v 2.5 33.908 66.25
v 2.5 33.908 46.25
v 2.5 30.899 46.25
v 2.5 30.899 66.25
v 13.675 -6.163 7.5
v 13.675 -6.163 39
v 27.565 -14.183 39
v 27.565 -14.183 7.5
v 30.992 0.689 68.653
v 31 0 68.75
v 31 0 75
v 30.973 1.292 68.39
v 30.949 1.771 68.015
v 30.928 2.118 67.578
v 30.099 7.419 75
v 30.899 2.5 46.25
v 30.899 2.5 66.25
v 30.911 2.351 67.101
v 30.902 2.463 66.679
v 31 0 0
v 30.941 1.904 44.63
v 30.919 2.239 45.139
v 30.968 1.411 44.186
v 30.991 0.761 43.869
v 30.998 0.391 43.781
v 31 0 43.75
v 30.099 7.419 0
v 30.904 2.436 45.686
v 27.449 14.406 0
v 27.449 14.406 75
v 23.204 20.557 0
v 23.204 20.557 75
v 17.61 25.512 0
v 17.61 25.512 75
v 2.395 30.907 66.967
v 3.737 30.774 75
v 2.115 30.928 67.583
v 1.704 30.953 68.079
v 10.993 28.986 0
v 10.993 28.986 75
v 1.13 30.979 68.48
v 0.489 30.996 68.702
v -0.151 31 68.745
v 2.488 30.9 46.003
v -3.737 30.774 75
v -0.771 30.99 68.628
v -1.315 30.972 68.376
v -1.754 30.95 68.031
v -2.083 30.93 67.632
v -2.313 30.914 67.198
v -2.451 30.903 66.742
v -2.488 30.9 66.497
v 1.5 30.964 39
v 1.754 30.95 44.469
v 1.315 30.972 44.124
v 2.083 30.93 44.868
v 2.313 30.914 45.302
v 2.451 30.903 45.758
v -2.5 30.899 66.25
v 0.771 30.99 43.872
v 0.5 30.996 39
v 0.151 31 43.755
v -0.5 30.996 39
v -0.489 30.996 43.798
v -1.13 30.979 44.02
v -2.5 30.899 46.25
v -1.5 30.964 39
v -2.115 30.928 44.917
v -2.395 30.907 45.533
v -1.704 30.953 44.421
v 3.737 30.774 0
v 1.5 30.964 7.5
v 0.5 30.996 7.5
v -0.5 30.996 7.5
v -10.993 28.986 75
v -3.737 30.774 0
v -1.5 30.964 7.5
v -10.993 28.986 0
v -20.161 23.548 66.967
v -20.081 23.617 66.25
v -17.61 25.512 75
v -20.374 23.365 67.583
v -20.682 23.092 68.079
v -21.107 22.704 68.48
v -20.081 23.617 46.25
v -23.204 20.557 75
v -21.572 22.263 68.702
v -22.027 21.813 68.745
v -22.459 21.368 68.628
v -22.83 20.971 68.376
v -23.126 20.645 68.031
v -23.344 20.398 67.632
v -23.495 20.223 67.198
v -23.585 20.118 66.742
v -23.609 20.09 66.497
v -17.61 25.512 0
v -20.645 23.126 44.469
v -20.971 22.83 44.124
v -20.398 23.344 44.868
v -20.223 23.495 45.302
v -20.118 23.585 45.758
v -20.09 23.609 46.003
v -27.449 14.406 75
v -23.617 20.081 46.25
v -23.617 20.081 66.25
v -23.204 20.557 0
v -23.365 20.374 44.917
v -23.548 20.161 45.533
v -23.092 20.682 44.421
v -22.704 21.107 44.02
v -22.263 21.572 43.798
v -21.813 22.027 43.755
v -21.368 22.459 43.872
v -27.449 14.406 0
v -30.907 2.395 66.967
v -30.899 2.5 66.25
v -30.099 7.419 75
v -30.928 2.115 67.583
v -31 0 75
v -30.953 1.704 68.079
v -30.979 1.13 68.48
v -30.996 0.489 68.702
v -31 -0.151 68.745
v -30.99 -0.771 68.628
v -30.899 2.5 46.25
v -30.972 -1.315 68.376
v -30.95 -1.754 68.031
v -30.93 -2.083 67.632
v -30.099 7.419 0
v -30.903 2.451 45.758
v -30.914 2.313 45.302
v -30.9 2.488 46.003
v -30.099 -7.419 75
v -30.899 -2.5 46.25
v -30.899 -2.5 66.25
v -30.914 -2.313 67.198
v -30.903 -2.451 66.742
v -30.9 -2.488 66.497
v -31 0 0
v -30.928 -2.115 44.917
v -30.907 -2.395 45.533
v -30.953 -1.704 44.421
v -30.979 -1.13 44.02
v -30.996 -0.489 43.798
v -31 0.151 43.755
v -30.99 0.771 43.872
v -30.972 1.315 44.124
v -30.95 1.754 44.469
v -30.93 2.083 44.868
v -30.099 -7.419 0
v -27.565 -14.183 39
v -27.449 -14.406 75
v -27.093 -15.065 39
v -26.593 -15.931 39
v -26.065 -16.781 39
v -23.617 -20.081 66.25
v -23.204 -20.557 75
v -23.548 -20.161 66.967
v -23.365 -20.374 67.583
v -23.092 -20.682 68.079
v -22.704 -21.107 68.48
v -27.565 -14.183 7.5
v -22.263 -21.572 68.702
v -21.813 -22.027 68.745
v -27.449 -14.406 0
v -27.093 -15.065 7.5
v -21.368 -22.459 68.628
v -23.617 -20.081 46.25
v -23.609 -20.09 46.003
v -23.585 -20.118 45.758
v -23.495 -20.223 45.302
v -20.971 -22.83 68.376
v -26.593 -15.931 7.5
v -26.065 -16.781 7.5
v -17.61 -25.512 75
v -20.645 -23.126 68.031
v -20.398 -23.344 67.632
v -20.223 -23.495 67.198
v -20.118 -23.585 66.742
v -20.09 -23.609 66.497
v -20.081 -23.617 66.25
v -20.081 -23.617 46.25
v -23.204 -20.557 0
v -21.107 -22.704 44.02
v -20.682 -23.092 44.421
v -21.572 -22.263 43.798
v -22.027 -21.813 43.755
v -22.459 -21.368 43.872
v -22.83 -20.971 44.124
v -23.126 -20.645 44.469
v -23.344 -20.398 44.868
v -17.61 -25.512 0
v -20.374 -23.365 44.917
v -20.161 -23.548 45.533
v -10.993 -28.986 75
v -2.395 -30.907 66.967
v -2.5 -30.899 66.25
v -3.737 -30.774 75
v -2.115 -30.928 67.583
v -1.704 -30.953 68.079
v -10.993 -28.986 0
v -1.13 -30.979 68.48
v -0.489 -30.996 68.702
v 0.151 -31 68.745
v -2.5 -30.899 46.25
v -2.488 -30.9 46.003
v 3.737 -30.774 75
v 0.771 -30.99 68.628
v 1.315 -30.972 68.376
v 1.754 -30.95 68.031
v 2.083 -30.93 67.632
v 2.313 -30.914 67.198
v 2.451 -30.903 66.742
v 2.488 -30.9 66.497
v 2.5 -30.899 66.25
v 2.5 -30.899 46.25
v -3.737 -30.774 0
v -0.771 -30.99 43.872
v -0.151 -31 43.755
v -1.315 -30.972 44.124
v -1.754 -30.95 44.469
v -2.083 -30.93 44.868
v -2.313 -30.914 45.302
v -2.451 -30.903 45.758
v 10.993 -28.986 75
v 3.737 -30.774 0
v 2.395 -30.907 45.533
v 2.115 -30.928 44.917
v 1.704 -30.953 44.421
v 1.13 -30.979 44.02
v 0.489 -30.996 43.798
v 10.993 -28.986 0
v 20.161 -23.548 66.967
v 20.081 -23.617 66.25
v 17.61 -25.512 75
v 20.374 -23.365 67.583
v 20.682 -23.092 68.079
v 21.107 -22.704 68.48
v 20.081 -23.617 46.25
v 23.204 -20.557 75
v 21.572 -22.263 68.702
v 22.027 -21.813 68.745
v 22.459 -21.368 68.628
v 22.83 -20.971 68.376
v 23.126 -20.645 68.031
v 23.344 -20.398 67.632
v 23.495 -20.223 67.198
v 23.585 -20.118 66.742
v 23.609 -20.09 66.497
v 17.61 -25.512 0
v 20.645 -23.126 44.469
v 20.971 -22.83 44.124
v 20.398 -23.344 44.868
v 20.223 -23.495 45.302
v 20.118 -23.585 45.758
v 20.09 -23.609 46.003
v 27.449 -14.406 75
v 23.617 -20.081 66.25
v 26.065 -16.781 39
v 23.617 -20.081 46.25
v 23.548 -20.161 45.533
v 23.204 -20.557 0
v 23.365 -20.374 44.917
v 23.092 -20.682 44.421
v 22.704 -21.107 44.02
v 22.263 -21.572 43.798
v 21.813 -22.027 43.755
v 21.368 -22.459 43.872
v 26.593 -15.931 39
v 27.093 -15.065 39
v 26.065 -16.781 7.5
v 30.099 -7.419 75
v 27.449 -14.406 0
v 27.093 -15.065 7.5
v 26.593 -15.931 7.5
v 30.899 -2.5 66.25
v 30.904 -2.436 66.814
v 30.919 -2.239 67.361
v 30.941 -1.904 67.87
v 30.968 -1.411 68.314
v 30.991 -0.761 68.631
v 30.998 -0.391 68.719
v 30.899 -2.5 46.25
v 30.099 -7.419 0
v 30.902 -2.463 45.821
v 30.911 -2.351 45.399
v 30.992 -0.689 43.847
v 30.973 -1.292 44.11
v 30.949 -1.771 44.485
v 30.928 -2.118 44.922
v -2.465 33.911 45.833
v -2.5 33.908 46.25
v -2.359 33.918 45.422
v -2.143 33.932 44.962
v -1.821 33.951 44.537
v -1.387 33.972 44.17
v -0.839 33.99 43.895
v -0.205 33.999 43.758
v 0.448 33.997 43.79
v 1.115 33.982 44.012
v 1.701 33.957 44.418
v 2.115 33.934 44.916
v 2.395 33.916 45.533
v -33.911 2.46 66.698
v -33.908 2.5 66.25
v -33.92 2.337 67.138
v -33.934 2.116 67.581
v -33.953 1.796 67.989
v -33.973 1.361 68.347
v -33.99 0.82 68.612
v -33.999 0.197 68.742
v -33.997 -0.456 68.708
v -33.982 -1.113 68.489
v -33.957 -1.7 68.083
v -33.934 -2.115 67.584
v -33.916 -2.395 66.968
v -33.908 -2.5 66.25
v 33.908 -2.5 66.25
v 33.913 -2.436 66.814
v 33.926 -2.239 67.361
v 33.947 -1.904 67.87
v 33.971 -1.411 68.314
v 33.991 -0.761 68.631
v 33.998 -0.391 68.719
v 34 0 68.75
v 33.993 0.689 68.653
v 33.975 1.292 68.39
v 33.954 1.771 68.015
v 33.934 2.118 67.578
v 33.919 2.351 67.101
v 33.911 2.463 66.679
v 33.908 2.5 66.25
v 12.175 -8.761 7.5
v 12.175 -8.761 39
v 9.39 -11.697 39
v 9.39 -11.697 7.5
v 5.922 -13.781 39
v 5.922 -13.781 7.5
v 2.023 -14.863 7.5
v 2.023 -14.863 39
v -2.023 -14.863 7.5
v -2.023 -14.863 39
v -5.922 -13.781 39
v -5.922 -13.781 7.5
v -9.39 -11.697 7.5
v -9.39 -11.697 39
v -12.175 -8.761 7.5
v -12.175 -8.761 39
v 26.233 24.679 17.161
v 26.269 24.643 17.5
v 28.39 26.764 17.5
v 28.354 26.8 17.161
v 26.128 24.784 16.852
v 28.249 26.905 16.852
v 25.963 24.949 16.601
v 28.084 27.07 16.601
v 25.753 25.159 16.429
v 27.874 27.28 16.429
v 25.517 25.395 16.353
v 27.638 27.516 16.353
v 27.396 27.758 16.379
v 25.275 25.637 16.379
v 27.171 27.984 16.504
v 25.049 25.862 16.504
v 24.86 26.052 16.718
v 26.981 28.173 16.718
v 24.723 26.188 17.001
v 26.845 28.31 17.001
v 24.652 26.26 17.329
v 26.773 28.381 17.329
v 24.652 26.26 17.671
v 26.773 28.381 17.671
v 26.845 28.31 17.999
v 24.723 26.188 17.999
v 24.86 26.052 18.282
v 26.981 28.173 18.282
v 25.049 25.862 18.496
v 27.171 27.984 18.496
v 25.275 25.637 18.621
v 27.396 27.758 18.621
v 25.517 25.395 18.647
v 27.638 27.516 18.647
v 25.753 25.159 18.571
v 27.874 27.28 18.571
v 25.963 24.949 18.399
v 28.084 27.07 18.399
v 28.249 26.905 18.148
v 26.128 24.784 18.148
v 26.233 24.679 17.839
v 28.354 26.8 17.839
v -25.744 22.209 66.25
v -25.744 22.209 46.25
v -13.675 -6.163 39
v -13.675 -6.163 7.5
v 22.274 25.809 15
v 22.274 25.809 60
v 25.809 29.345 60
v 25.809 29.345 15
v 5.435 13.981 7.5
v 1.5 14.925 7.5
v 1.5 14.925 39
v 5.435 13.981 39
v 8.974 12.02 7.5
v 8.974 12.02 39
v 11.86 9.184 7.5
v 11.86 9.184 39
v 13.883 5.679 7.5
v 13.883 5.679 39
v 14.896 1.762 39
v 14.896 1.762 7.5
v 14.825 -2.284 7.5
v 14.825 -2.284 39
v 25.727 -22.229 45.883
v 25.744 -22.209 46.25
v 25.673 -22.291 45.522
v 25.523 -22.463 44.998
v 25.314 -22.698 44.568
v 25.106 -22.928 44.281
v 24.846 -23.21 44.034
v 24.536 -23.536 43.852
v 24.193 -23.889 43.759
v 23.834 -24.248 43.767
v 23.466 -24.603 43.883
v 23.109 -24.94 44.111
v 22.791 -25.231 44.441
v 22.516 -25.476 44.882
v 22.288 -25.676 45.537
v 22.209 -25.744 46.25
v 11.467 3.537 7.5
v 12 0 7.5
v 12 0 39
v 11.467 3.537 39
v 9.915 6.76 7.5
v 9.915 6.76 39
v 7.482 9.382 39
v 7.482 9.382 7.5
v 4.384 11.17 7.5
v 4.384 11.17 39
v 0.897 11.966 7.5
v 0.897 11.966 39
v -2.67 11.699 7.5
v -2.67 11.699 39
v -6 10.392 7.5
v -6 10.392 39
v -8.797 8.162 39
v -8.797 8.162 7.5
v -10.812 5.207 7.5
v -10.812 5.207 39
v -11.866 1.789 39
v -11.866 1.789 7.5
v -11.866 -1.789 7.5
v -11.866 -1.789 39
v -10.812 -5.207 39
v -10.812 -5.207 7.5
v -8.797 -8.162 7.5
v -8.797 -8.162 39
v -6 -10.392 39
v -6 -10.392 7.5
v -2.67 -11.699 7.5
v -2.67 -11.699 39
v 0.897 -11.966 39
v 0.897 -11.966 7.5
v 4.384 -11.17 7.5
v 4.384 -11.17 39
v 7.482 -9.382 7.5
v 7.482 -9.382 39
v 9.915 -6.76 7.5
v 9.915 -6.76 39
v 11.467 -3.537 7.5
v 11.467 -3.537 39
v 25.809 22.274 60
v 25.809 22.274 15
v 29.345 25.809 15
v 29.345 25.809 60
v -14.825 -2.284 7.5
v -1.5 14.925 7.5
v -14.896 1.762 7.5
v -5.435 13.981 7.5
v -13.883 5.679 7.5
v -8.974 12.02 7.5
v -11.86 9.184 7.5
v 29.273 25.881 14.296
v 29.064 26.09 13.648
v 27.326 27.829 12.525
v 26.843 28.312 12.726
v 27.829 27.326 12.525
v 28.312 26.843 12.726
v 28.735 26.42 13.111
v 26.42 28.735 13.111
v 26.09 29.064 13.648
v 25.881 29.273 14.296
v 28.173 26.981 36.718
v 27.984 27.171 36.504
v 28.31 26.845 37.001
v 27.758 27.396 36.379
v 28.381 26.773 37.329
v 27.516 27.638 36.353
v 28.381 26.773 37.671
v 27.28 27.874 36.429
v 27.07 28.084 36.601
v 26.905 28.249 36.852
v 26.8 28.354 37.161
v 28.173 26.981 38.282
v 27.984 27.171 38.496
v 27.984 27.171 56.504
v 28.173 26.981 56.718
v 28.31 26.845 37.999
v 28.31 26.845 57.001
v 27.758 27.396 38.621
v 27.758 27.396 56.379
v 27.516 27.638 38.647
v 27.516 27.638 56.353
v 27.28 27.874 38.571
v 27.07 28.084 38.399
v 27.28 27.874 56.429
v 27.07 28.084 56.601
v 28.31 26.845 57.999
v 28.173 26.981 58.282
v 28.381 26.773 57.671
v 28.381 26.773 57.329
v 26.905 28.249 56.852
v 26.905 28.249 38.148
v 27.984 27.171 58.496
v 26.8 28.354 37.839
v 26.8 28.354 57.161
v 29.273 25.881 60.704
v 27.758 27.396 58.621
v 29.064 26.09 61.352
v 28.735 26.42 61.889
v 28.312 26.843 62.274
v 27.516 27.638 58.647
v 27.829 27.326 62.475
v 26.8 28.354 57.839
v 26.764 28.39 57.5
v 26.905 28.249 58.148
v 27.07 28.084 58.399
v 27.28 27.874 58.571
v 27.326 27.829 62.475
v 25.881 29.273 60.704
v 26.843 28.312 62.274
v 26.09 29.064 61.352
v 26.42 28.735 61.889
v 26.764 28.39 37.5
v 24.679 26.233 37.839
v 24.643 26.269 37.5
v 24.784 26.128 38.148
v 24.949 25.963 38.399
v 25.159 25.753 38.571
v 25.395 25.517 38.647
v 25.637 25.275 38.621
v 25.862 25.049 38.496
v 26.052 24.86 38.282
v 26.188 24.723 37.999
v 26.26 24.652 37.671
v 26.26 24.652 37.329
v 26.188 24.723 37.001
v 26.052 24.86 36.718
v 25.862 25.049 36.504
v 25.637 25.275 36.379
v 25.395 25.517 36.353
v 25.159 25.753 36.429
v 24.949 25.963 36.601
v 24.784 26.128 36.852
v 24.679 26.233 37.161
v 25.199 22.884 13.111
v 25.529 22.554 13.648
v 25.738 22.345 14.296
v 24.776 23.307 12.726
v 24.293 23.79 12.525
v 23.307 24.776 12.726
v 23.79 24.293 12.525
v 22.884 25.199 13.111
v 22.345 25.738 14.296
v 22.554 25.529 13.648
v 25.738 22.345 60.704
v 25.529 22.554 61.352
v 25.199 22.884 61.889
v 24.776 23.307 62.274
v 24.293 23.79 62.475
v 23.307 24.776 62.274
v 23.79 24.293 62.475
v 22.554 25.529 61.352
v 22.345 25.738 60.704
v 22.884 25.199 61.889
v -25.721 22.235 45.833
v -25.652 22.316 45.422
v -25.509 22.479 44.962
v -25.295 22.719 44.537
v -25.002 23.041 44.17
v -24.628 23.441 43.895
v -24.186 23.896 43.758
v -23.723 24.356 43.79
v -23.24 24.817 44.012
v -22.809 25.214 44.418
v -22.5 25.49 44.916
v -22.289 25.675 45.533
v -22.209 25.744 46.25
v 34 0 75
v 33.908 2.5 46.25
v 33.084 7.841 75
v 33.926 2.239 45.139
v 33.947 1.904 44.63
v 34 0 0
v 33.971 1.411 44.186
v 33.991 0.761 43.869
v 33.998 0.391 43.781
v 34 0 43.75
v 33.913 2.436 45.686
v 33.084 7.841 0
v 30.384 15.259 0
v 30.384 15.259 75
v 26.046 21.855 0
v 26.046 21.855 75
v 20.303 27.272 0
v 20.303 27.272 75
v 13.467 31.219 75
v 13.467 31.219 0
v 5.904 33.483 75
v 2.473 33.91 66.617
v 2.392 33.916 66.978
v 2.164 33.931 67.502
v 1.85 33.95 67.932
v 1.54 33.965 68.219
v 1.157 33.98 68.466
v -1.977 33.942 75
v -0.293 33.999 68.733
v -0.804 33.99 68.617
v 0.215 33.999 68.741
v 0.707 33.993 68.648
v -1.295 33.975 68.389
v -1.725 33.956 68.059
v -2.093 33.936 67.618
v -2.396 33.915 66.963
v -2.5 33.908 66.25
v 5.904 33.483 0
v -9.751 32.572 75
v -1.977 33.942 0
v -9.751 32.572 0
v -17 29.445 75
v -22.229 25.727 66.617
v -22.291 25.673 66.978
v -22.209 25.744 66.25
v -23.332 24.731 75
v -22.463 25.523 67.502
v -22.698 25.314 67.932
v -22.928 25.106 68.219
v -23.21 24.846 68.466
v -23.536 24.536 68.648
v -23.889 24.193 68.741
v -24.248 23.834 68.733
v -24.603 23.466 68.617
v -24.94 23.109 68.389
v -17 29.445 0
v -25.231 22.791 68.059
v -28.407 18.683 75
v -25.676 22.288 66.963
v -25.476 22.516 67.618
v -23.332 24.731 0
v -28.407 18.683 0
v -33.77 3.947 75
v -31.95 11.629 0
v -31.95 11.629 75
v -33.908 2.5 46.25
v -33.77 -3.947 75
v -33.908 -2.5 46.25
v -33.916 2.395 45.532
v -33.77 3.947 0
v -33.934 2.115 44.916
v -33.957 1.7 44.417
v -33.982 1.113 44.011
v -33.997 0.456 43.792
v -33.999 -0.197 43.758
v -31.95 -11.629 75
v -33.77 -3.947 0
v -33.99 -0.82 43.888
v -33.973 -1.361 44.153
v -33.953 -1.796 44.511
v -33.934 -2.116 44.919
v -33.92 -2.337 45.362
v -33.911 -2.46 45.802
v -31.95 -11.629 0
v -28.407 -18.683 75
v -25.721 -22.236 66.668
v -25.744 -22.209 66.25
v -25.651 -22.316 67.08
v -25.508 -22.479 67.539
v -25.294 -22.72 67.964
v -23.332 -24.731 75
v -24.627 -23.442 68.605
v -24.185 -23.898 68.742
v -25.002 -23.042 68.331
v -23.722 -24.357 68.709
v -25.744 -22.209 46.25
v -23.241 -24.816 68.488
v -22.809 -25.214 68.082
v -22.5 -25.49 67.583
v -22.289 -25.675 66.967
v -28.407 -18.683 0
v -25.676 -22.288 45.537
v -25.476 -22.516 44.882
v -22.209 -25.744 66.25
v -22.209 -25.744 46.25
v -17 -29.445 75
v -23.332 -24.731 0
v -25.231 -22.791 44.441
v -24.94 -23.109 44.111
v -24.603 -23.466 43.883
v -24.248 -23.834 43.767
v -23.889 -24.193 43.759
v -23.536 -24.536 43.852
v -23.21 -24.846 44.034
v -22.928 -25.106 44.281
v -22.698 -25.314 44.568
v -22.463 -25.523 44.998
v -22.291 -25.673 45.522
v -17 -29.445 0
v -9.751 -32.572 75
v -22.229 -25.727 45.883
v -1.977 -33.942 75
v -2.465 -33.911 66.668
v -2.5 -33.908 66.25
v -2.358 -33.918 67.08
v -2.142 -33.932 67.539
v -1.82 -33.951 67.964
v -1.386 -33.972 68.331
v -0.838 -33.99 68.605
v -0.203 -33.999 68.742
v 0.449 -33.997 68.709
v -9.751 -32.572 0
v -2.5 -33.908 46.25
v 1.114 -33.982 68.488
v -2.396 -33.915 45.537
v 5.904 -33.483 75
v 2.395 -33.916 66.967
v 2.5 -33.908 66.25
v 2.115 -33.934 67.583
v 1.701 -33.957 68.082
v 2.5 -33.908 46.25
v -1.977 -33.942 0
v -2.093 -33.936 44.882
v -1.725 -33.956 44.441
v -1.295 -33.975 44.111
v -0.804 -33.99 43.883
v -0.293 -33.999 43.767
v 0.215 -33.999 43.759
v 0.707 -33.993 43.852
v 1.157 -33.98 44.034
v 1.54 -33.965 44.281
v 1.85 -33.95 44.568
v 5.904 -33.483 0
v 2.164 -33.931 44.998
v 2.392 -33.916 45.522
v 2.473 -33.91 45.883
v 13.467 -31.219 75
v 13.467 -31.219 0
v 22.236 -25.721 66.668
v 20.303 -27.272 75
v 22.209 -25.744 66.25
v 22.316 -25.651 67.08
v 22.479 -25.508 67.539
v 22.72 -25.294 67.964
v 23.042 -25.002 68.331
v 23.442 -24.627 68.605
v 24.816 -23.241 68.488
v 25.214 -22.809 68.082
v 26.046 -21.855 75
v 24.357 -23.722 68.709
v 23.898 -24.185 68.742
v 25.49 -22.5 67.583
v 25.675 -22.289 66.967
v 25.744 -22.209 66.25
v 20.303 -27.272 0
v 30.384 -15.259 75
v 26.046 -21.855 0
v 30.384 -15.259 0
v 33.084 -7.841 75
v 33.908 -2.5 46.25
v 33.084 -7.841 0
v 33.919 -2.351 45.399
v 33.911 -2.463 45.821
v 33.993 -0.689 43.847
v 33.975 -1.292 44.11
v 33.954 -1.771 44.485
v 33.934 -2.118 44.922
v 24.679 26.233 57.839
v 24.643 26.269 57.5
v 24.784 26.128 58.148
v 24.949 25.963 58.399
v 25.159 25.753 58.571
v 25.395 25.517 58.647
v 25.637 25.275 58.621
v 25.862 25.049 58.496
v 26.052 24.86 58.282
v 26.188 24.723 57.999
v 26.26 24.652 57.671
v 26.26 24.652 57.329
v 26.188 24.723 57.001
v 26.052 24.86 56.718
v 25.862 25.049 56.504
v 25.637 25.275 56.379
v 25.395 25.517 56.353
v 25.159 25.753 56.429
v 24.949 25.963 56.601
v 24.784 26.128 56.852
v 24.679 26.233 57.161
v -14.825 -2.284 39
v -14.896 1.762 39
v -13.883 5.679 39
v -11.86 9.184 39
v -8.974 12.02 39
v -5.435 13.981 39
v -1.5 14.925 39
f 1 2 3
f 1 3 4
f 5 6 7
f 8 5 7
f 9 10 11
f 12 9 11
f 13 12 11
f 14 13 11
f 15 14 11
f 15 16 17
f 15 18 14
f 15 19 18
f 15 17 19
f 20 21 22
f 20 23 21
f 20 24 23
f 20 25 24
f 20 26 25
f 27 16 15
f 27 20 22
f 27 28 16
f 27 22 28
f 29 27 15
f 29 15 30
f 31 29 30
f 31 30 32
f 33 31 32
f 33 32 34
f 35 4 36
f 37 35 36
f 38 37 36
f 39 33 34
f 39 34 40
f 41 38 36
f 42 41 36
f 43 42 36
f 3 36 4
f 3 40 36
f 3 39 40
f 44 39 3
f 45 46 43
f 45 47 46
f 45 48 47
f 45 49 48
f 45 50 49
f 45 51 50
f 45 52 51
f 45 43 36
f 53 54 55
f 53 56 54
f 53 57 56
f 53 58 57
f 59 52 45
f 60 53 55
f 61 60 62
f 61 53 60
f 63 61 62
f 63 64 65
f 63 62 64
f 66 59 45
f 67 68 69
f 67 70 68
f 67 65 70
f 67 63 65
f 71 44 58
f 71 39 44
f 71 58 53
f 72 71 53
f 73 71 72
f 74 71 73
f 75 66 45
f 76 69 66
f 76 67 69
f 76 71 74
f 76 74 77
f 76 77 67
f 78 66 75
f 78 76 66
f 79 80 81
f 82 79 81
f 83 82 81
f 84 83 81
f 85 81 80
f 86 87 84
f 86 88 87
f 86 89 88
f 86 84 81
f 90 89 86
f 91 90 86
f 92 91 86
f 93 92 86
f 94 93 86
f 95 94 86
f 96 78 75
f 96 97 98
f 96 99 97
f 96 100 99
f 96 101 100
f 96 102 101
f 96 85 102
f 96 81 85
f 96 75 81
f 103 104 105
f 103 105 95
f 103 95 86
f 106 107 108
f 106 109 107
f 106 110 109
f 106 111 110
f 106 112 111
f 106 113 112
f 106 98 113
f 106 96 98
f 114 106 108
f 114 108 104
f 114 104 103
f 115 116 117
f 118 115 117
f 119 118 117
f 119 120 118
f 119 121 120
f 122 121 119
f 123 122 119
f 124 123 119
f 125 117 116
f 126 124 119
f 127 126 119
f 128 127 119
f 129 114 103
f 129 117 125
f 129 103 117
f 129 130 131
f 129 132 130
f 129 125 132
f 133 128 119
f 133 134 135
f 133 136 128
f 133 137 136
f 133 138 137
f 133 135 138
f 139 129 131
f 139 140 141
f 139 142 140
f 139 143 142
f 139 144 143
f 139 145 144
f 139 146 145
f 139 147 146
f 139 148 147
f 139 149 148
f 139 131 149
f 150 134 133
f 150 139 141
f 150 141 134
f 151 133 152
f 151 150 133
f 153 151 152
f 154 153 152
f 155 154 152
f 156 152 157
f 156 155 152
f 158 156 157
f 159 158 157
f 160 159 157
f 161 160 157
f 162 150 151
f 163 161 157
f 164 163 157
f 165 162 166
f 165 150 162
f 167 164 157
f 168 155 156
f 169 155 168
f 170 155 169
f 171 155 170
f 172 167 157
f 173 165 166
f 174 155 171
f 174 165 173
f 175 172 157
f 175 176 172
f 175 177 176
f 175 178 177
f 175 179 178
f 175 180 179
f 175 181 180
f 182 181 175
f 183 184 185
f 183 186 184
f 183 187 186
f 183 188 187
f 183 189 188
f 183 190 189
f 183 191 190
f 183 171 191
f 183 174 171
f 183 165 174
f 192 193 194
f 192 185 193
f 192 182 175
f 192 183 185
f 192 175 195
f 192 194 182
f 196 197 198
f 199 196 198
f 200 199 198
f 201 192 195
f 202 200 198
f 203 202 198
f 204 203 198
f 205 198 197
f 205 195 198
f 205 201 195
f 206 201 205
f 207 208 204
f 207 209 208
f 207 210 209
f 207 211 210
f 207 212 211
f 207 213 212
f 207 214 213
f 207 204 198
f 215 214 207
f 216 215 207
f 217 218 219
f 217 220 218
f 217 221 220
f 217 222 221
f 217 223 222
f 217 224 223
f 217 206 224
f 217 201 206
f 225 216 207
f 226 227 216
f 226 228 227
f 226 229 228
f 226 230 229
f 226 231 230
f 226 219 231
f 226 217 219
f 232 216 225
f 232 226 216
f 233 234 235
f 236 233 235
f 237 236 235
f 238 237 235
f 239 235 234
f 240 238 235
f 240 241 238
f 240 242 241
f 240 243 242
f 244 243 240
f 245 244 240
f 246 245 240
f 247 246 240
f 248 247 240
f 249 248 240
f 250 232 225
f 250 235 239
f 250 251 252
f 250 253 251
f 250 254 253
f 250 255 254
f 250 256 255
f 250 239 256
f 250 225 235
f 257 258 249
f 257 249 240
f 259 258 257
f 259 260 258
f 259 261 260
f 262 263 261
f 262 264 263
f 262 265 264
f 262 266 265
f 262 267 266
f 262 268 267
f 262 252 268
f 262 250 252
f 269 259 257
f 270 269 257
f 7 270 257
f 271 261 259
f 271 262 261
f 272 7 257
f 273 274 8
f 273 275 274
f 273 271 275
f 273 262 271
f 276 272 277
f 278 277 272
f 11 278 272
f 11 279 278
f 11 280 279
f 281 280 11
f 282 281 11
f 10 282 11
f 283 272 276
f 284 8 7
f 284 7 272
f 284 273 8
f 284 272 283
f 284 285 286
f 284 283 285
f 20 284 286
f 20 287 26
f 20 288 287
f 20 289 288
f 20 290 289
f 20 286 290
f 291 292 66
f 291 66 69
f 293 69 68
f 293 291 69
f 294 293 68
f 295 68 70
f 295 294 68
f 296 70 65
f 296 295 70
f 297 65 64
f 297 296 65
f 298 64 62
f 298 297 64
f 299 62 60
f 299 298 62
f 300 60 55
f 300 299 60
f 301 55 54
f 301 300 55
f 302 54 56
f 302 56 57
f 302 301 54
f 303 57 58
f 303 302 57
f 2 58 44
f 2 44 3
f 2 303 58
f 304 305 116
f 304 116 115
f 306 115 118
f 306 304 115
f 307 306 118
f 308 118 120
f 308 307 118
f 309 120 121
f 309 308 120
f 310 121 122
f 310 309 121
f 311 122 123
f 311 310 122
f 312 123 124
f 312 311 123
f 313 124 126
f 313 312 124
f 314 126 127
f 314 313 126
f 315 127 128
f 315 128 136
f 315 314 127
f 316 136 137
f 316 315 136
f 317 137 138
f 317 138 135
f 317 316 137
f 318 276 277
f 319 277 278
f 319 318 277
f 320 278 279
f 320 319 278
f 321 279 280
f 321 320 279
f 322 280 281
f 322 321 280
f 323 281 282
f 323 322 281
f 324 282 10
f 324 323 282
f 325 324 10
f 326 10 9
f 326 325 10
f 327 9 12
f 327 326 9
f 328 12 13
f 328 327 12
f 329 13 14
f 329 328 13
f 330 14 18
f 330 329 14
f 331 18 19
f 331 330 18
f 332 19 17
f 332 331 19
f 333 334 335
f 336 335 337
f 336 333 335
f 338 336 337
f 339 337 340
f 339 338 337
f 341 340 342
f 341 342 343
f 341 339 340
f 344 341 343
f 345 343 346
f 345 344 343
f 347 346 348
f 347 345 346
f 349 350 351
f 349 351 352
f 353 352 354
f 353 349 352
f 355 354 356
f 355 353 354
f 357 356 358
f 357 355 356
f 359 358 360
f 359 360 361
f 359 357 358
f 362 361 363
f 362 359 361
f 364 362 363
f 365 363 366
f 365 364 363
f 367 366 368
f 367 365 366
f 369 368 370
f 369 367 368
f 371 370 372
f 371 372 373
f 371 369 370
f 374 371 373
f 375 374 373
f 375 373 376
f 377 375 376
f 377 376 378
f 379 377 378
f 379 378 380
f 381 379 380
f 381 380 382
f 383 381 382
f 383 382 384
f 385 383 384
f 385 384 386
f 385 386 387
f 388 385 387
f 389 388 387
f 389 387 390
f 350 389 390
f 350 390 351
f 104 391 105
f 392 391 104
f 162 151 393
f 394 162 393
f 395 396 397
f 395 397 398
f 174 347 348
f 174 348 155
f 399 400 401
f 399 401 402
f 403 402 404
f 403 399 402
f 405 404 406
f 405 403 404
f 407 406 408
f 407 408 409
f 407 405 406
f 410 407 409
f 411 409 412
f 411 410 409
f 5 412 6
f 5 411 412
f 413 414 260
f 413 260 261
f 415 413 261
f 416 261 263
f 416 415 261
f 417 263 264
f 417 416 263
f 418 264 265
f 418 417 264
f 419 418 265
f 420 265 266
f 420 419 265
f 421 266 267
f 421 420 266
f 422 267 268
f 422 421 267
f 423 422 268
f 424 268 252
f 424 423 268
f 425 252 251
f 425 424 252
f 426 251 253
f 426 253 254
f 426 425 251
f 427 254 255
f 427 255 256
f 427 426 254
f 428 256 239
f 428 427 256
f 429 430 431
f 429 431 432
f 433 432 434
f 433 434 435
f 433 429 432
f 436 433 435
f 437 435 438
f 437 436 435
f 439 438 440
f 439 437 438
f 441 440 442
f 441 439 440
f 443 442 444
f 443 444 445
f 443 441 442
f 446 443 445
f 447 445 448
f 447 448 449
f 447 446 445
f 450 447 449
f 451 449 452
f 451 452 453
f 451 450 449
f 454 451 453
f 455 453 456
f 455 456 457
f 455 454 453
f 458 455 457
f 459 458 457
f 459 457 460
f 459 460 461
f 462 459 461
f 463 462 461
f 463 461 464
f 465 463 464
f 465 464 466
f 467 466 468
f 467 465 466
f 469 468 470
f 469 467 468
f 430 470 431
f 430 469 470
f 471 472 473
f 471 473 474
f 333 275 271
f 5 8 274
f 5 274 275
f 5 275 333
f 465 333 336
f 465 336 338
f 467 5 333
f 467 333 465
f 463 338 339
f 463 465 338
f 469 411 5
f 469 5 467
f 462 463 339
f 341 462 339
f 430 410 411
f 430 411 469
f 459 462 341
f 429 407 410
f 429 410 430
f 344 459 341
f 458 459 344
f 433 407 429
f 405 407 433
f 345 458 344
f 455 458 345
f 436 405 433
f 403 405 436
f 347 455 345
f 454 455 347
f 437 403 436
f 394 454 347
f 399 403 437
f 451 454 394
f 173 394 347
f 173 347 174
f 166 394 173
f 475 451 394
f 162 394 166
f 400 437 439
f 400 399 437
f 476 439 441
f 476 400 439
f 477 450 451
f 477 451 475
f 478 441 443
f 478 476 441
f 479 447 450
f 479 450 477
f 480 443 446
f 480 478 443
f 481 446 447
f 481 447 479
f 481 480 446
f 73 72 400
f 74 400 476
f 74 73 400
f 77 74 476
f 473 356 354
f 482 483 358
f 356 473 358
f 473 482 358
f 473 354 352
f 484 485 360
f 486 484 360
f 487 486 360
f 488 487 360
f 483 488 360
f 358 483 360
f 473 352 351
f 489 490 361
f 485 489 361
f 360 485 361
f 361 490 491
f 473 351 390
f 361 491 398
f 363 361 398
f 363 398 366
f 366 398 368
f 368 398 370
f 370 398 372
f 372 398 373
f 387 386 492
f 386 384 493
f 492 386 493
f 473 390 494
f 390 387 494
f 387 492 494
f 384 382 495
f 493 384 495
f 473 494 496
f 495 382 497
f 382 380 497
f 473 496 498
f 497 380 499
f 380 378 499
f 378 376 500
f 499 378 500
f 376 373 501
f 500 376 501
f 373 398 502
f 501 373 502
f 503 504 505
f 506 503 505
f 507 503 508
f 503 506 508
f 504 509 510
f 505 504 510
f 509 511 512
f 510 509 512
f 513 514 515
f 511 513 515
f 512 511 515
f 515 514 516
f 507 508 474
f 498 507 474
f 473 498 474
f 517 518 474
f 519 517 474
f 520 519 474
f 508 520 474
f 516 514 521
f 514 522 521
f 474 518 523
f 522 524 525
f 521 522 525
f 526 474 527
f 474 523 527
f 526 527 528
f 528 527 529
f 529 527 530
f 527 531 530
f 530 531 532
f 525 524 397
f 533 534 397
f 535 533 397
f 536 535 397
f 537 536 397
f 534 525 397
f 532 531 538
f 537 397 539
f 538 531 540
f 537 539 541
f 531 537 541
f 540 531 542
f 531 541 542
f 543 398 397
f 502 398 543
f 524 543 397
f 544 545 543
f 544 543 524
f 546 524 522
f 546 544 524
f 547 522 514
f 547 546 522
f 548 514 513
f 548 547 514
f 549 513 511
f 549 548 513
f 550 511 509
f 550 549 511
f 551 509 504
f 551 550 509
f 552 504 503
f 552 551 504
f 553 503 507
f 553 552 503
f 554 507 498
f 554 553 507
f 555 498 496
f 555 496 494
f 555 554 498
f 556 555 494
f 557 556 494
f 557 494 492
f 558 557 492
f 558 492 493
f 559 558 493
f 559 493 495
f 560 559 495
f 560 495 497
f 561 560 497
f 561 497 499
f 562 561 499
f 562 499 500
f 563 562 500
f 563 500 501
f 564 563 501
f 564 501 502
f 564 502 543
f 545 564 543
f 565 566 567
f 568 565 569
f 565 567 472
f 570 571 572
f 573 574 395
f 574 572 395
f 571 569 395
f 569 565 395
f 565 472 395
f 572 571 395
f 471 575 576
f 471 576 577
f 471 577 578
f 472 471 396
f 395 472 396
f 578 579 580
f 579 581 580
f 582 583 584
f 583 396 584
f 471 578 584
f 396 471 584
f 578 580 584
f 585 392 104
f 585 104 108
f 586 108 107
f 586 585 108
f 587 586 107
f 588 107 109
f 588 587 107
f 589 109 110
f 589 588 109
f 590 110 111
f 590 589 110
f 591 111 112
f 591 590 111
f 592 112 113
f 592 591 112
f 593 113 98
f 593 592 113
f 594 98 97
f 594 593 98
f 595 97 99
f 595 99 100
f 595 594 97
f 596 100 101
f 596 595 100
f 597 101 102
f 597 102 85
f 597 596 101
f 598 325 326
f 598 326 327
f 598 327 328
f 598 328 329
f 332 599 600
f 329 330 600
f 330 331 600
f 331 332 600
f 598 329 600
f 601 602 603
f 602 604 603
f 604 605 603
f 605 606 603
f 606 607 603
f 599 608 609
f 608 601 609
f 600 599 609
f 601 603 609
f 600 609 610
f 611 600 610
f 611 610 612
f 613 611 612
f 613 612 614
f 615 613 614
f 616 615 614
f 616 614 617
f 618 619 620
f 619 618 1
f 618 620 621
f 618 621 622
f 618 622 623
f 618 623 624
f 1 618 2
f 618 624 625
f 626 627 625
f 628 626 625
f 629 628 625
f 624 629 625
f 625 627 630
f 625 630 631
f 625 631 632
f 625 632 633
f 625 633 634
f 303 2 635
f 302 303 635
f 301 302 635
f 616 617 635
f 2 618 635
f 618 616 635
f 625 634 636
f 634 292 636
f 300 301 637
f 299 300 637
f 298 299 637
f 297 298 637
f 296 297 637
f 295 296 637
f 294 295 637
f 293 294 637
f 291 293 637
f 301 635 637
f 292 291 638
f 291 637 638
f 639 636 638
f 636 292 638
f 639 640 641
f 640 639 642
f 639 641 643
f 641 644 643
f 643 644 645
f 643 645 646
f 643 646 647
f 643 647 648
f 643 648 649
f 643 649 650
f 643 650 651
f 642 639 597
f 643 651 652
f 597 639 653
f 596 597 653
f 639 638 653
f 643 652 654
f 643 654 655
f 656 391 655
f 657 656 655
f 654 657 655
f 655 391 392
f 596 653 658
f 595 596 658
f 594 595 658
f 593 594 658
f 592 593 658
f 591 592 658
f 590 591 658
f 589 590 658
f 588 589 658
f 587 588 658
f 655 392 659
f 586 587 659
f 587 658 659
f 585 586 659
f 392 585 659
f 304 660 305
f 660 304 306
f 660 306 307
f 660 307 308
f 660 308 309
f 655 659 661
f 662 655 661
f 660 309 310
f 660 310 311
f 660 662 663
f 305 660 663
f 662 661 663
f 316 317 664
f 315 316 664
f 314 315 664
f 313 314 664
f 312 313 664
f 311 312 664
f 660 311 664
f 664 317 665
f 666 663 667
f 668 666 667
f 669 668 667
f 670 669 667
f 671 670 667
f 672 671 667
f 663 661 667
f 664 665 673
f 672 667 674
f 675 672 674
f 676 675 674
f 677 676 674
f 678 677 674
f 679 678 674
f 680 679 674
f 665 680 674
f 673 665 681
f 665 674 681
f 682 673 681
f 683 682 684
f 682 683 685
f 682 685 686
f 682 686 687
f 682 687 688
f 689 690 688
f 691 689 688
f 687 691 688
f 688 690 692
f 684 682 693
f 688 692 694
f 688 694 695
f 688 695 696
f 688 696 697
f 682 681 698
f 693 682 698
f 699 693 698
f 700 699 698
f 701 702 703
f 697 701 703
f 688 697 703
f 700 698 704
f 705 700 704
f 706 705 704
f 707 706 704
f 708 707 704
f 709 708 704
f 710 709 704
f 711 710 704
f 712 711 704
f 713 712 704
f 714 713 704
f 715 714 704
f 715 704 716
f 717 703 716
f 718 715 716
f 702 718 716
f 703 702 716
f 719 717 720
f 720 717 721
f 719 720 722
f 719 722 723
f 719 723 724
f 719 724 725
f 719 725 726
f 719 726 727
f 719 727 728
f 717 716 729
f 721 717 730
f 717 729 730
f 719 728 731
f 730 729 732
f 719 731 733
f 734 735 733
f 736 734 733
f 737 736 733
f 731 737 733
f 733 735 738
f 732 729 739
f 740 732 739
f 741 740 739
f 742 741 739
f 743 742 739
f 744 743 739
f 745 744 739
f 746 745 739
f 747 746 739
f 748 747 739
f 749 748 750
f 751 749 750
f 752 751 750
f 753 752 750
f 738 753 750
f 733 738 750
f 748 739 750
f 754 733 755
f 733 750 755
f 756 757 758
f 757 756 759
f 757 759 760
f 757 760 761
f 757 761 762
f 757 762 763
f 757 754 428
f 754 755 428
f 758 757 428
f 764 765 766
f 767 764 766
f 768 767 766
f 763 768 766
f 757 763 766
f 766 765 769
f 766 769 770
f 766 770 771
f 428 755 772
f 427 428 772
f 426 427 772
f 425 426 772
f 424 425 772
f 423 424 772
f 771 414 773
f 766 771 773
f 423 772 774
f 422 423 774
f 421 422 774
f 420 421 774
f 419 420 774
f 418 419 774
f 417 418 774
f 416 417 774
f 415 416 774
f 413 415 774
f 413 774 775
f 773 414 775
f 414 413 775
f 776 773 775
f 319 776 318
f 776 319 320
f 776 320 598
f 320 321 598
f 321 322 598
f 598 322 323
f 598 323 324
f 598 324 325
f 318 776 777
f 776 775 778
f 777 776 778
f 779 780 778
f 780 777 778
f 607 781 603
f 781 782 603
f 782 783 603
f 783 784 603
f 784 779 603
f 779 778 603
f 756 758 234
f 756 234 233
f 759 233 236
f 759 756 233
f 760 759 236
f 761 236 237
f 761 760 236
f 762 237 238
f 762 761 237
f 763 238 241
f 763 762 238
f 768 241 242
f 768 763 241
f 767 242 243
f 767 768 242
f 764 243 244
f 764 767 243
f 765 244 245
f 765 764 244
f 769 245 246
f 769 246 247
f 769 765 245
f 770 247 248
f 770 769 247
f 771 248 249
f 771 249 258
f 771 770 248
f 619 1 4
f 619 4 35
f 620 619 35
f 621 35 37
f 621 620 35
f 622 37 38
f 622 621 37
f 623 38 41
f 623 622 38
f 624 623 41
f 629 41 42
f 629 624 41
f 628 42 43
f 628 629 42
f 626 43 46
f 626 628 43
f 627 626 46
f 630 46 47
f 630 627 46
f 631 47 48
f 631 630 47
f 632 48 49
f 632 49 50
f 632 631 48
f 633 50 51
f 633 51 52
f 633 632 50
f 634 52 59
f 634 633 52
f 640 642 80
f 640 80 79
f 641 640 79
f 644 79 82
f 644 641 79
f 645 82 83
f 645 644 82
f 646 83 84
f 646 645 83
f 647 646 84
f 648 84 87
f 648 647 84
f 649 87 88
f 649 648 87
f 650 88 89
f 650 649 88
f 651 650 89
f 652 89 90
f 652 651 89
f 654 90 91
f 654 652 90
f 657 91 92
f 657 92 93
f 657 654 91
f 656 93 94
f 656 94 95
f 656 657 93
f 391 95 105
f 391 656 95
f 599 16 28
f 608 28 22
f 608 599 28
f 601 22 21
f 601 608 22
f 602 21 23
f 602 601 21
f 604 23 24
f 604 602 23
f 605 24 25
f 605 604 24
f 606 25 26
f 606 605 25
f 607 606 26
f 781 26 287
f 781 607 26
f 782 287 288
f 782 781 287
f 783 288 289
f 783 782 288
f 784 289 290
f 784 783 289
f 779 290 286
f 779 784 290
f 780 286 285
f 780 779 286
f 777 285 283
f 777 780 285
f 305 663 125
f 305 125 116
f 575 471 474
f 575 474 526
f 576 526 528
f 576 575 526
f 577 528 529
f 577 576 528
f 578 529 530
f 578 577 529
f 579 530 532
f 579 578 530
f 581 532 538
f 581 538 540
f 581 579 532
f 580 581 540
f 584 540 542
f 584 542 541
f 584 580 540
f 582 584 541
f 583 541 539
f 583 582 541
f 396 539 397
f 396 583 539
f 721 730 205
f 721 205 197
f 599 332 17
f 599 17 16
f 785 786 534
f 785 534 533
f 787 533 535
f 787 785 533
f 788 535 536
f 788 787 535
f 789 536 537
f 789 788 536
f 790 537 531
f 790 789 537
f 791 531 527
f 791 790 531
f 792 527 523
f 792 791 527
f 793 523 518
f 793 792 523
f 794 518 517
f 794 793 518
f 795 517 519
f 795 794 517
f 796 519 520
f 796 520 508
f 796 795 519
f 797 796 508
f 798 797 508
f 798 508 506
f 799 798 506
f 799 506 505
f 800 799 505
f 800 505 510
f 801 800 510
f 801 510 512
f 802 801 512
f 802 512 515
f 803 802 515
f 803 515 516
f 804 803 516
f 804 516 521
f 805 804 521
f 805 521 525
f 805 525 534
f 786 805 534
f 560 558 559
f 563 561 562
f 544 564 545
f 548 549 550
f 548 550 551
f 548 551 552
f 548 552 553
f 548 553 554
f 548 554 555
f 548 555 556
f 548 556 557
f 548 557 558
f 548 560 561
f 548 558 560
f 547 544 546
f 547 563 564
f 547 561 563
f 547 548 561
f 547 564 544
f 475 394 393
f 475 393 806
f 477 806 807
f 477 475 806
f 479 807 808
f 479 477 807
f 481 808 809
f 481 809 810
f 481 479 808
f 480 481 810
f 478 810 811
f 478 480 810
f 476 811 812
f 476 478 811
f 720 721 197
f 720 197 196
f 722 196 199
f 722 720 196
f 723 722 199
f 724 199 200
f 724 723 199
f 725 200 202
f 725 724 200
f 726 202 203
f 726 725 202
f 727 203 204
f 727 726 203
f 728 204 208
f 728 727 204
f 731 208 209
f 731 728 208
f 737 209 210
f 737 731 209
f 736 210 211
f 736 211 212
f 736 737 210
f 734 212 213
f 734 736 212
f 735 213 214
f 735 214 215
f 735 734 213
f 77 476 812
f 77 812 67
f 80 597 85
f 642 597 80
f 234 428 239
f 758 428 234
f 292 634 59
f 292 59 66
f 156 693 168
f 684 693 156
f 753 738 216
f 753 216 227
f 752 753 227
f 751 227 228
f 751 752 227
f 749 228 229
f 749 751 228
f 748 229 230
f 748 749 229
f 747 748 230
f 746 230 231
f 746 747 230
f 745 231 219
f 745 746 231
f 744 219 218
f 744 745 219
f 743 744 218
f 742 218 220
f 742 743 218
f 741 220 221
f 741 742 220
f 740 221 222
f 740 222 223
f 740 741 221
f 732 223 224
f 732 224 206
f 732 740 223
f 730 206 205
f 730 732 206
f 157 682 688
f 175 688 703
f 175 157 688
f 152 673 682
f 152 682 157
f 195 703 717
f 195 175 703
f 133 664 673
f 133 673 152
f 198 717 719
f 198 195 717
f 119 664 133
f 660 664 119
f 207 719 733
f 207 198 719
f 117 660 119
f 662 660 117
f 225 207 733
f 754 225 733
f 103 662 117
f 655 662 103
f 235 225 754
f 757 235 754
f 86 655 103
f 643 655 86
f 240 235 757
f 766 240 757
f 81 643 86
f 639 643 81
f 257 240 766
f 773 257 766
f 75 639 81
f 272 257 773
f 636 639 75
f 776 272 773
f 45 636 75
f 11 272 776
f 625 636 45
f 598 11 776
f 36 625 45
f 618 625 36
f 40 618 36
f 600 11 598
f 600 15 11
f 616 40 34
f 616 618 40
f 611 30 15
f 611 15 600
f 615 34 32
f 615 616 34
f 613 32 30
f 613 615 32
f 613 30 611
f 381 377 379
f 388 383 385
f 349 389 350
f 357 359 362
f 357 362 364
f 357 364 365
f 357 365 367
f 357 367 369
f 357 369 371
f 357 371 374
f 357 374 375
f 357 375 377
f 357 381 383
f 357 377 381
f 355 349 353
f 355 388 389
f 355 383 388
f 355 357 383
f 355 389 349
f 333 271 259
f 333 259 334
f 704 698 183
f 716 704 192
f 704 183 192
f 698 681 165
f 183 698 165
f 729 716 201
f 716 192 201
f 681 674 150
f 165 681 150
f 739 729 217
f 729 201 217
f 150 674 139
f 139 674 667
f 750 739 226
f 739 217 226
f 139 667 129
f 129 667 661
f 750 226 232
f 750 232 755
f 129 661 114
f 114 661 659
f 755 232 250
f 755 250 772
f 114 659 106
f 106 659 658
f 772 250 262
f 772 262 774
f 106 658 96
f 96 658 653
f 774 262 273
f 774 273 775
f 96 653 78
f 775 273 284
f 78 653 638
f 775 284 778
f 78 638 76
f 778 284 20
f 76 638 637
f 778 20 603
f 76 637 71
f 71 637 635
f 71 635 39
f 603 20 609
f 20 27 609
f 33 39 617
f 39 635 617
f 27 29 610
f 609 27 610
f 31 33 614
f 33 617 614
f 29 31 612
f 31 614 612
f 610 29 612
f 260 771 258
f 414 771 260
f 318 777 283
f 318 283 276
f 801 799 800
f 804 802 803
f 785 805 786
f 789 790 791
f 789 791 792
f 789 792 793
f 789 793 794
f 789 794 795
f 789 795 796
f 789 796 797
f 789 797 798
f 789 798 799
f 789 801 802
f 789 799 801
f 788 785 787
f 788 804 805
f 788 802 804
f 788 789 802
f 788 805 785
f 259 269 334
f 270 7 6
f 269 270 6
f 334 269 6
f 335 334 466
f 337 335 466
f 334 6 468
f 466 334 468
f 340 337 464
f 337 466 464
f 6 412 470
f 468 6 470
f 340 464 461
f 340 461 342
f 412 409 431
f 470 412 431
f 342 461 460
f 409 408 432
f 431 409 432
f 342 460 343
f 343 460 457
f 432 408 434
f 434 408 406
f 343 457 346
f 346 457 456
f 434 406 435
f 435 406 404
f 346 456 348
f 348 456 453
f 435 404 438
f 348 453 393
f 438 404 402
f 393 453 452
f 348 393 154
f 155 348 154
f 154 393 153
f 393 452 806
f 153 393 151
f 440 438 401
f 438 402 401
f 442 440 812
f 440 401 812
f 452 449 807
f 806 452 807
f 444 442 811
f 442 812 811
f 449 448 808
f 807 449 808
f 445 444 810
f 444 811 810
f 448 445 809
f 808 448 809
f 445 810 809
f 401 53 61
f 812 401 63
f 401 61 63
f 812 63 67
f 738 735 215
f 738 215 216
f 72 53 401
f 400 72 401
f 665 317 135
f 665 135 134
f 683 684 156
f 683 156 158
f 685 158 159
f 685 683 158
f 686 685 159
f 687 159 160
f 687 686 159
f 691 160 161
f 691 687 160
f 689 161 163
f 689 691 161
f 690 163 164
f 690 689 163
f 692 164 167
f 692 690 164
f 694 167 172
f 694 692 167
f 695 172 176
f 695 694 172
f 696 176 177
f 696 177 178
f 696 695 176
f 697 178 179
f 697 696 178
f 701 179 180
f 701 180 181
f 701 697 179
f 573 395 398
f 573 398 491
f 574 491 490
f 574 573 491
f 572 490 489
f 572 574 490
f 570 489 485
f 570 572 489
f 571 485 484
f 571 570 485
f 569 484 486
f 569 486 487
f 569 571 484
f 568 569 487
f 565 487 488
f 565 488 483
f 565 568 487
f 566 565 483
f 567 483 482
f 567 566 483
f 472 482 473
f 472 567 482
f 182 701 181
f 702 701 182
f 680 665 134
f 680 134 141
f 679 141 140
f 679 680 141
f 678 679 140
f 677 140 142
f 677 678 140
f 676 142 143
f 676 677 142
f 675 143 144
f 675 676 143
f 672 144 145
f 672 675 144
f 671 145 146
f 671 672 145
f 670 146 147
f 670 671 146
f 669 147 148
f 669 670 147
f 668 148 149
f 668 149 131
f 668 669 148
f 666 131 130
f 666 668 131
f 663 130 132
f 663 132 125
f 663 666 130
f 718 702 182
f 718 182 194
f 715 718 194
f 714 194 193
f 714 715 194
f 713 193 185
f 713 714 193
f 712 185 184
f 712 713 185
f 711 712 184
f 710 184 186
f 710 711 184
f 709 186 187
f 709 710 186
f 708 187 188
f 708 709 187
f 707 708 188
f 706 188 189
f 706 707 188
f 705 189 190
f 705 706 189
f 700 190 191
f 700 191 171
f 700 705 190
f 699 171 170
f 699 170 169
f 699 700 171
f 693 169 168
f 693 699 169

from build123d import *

# Parameters (mm, degrees)
SKETCH2_R                = 34
SKETCH2_R_2              = 31
BOSS_EXTRUDE1_DEPTH      = 75
BOSS_EXTRUDE2_DEPTH      = 1.5
BOSS_EXTRUDE2_DEPTH_BACK = 30
SKETCH3_R                = 12
CUT_EXTRUDE2_REACH       = 108.794
CUT_EXTRUDE2_END_RADIUS  = 31
CIRPATTERN1_COUNT        = 7
CIRPATTERN1_ANGLE        = 270
SKETCH6_R                = 1.15
BOSS_EXTRUDE4_DEPTH      = 5
SKETCH7_R                = 1.15
BOSS_EXTRUDE5_DEPTH      = 2


with BuildPart() as part:
    # Sketch2 → Boss-Extrude1 (new body)
    with BuildSketch(Plane.XY):
        Circle(SKETCH2_R)
        Circle(SKETCH2_R_2, mode=Mode.SUBTRACT)
    extrude(amount=BOSS_EXTRUDE1_DEPTH)

    # Sketch3 → Boss-Extrude2 (add, two sides: drawn at the far end of the back side and taken through both)
    with BuildSketch(Plane.XY.offset(37.5).offset(-BOSS_EXTRUDE2_DEPTH_BACK)):
        with BuildLine():
            ThreePointArc((12.175265955, -8.761443884), (0, -15), (-12.175265955, -8.761443884))
            Line((-12.175265955, -8.761443884), (-26.096787517, -16.799038106))
            ThreePointArc((-26.096787517, -16.799038106), (-26.878197484, -15.518134553), (-27.596787517, -14.200961894))
            Line((-27.596787517, -14.200961894), (-13.675265955, -6.163367673))
            ThreePointArc((-13.675265955, -6.163367673), (-12.990381057, 7.5), (-1.5, 14.924811557))
            Line((-1.5, 14.924811557), (-1.5, 30.963688411))
            ThreePointArc((-1.5, 30.963688411), (0, 31), (1.5, 30.963688411))
            Line((1.5, 30.963688411), (1.5, 14.924811557))
            ThreePointArc((1.5, 14.924811557), (12.990381057, 7.5), (13.675265955, -6.163367673))
            Line((13.675265955, -6.163367673), (27.596787517, -14.200961894))
            ThreePointArc((27.596787517, -14.200961894), (26.878197484, -15.518134553), (26.096787517, -16.799038106))
            Line((26.096787517, -16.799038106), (12.175265955, -8.761443884))
        make_face()
        Circle(SKETCH3_R, mode=Mode.SUBTRACT)
    extrude(amount=BOSS_EXTRUDE2_DEPTH + BOSS_EXTRUDE2_DEPTH_BACK)

    # Cut-Extrude2: up to this cylinder (the profile starts outside it)
    cut_extrude2_end = Plane(origin=(0, 0, 56.25), z_dir=(0, 0, -1)) * Cylinder(CUT_EXTRUDE2_END_RADIUS, 280.588, mode=Mode.PRIVATE)
    # Sketch5 → Cut-Extrude2 (cut, up to the surface)
    with BuildSketch(Plane(origin=(34, 0, 0), x_dir=(0, 0, -1), z_dir=(1, 0, 0)), mode=Mode.PRIVATE) as cut_extrude2_sk1:
        with BuildLine():
            Line((-66.25, 2.5), (-46.25, 2.5))
            ThreePointArc((-46.25, 2.5), (-43.75, 0), (-46.25, -2.5))
            Line((-46.25, -2.5), (-66.25, -2.5))
            ThreePointArc((-66.25, -2.5), (-68.75, 0), (-66.25, 2.5))
        make_face()
    cut_extrude2_tool1 = extrude(cut_extrude2_sk1.sketch, amount=-CUT_EXTRUDE2_REACH, mode=Mode.PRIVATE) - cut_extrude2_end
    cut_extrude2 = cut_extrude2_tool1.solids().sort_by_distance((34, 0, 56.25))[0]
    add(cut_extrude2, mode=Mode.SUBTRACT)

    # CirPattern1: Cut-Extrude2 ×7 about axis
    cirpattern1_axis = Axis((0, 0, 0), (0, 0, -1))
    for i in range(1, CIRPATTERN1_COUNT):
        add(cut_extrude2.rotate(cirpattern1_axis, i * CIRPATTERN1_ANGLE / (CIRPATTERN1_COUNT - 1)), mode=Mode.SUBTRACT)


with BuildPart() as body_2:
    # Sketch6 → Boss-Extrude4 (new body)
    with BuildSketch(Plane(origin=(24.04163056, 24.04163056, 0), x_dir=(0, 0, -1), z_dir=(0.7071067811865488, 0.7071067811865464, 0))):
        with BuildLine():
            Line((-60, 2.5), (-15, 2.5))
            ThreePointArc((-15, 2.5), (-12.5, 0), (-15, -2.5))
            Line((-15, -2.5), (-60, -2.5))
            ThreePointArc((-60, -2.5), (-62.5, 0), (-60, 2.5))
        make_face()
        with Locations(Location((-37.5, 0, 0), (0, 0, 90))):
            Circle(SKETCH6_R, mode=Mode.SUBTRACT)
        with Locations(Location((-57.5, 0, 0), (0, 0, 90))):
            Circle(SKETCH6_R, mode=Mode.SUBTRACT)
        with Locations(Location((-17.5, 0, 0), (0, 0, 270))):
            Circle(SKETCH6_R, mode=Mode.SUBTRACT)
    extrude(amount=BOSS_EXTRUDE4_DEPTH)

    # Sketch7 → Boss-Extrude5 (add)
    with BuildSketch(Plane(origin=(24.04163056, 24.04163056, 0), x_dir=(0, 0, -1), z_dir=(0.7071067811865488, 0.7071067811865464, 0))):
        with Locations(Location((-57.5, 0, 0), (0, 0, 90))):
            Circle(SKETCH7_R)
        with Locations(Location((-37.5, 0, 0), (0, 0, 90))):
            Circle(SKETCH7_R)
        with Locations(Location((-17.5, 0, 0), (0, 0, 270))):
            Circle(SKETCH7_R)
    extrude(amount=BOSS_EXTRUDE5_DEPTH)


solid = Compound([part.part, body_2.part])
